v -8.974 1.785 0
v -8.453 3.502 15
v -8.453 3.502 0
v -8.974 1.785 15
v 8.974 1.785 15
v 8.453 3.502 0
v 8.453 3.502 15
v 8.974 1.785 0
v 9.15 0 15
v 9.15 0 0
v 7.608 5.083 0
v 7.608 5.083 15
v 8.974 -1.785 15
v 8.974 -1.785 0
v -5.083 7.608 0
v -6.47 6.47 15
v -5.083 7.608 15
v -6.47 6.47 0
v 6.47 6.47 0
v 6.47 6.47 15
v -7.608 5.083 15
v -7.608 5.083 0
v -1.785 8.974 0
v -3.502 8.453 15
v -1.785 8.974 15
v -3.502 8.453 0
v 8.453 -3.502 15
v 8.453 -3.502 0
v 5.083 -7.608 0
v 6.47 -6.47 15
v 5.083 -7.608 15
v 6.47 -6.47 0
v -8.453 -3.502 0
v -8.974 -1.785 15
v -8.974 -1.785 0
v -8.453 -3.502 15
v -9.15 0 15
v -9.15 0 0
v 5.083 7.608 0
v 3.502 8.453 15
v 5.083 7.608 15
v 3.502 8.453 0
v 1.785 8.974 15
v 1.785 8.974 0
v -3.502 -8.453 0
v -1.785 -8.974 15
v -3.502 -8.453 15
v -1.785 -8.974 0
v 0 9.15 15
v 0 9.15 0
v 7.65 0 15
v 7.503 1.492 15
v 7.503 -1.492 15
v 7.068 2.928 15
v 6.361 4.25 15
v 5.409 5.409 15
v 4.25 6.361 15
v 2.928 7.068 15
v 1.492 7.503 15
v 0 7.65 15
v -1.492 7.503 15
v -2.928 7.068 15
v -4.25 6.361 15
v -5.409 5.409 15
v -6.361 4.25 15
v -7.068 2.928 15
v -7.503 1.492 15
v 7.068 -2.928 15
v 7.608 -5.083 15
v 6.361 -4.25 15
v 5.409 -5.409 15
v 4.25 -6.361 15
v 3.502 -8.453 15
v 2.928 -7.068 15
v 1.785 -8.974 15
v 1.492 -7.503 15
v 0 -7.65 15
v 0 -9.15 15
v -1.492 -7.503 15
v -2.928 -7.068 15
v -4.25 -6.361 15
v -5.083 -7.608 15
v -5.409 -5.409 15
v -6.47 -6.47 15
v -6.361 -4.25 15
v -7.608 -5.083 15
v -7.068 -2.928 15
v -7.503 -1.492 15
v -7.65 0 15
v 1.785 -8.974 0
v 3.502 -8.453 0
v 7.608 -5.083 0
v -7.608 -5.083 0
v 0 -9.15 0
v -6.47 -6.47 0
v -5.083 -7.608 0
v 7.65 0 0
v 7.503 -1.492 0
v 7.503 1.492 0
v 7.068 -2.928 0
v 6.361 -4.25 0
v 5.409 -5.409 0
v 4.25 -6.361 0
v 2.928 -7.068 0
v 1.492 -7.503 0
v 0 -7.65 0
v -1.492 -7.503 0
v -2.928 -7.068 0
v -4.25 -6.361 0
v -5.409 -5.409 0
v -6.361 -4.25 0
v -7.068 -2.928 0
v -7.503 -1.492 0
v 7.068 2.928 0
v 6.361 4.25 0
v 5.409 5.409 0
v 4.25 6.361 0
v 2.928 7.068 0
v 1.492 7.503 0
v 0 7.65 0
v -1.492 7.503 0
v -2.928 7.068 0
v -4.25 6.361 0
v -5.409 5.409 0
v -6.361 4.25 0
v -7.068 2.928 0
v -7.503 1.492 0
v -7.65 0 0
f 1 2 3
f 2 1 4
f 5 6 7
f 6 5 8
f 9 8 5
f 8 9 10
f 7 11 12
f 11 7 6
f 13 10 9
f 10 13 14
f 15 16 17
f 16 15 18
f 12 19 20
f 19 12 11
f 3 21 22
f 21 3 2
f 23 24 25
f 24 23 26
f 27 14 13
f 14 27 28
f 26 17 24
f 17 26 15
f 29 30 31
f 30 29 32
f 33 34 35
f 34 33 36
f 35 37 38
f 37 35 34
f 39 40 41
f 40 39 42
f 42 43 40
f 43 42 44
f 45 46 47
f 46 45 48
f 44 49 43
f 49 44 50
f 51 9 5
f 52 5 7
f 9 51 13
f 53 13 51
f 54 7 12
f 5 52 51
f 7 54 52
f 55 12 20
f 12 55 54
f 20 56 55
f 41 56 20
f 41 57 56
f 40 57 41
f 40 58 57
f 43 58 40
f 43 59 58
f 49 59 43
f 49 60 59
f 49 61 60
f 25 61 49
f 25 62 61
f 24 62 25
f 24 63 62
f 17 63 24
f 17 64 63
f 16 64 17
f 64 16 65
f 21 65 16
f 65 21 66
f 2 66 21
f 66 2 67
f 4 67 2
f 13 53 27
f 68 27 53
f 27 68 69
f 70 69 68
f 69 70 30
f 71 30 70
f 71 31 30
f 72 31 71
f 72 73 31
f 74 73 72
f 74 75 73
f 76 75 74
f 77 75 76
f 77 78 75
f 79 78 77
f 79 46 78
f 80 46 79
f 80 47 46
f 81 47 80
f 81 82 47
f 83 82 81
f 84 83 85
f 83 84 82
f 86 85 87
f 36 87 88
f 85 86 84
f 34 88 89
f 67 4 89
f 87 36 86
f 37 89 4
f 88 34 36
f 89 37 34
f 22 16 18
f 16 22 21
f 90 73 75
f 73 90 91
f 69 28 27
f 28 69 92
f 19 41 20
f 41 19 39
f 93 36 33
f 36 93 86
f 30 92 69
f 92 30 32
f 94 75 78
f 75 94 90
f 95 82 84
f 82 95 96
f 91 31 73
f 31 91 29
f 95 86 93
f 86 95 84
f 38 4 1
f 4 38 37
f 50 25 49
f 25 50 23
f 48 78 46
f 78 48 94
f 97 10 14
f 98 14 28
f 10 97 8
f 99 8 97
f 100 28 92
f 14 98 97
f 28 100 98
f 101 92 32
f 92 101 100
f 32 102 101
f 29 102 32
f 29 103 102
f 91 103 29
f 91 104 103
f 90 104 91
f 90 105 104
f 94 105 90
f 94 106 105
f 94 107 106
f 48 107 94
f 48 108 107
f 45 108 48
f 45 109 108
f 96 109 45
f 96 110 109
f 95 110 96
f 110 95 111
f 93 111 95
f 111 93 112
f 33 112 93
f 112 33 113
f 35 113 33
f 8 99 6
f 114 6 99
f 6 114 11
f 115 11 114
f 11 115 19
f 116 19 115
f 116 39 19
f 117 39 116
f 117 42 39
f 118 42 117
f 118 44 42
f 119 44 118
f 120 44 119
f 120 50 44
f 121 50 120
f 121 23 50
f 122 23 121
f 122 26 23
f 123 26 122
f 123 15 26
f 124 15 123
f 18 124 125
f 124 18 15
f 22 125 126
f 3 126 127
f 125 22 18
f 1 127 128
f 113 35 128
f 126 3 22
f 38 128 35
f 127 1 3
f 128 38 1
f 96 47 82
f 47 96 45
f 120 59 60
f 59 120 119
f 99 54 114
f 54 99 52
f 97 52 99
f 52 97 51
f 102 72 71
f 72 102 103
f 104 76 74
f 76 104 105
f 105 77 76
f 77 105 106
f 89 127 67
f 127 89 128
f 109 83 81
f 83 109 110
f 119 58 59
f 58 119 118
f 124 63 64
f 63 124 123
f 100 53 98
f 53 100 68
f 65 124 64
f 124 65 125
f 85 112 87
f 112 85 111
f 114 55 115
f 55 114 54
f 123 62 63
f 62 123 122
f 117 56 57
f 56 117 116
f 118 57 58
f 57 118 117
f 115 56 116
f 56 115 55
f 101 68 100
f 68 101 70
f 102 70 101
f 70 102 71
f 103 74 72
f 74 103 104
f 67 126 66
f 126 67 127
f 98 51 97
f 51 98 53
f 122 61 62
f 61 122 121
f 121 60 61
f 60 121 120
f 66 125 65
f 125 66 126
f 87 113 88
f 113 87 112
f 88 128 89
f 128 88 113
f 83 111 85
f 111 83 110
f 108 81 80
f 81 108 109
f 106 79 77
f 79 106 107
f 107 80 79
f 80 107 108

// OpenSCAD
$fn = 32;

// ----------------------------------------------------------------------
// Spacer sleeve: 18.3 / 15.3 x 15 mm
// ----------------------------------------------------------------------

// --- parameters (mm) ---
sleeve_od = 18.3;         // outside diameter
sleeve_id = 15.3;         // shaft bore
sleeve_l = 15;            // sleeve length

module sleeve() {
  cylinder(h = sleeve_l, d = sleeve_od);
}

difference() {
  sleeve();
  translate([0, 0, -1]) cylinder(h = sleeve_l + 2, d = sleeve_id);
}
